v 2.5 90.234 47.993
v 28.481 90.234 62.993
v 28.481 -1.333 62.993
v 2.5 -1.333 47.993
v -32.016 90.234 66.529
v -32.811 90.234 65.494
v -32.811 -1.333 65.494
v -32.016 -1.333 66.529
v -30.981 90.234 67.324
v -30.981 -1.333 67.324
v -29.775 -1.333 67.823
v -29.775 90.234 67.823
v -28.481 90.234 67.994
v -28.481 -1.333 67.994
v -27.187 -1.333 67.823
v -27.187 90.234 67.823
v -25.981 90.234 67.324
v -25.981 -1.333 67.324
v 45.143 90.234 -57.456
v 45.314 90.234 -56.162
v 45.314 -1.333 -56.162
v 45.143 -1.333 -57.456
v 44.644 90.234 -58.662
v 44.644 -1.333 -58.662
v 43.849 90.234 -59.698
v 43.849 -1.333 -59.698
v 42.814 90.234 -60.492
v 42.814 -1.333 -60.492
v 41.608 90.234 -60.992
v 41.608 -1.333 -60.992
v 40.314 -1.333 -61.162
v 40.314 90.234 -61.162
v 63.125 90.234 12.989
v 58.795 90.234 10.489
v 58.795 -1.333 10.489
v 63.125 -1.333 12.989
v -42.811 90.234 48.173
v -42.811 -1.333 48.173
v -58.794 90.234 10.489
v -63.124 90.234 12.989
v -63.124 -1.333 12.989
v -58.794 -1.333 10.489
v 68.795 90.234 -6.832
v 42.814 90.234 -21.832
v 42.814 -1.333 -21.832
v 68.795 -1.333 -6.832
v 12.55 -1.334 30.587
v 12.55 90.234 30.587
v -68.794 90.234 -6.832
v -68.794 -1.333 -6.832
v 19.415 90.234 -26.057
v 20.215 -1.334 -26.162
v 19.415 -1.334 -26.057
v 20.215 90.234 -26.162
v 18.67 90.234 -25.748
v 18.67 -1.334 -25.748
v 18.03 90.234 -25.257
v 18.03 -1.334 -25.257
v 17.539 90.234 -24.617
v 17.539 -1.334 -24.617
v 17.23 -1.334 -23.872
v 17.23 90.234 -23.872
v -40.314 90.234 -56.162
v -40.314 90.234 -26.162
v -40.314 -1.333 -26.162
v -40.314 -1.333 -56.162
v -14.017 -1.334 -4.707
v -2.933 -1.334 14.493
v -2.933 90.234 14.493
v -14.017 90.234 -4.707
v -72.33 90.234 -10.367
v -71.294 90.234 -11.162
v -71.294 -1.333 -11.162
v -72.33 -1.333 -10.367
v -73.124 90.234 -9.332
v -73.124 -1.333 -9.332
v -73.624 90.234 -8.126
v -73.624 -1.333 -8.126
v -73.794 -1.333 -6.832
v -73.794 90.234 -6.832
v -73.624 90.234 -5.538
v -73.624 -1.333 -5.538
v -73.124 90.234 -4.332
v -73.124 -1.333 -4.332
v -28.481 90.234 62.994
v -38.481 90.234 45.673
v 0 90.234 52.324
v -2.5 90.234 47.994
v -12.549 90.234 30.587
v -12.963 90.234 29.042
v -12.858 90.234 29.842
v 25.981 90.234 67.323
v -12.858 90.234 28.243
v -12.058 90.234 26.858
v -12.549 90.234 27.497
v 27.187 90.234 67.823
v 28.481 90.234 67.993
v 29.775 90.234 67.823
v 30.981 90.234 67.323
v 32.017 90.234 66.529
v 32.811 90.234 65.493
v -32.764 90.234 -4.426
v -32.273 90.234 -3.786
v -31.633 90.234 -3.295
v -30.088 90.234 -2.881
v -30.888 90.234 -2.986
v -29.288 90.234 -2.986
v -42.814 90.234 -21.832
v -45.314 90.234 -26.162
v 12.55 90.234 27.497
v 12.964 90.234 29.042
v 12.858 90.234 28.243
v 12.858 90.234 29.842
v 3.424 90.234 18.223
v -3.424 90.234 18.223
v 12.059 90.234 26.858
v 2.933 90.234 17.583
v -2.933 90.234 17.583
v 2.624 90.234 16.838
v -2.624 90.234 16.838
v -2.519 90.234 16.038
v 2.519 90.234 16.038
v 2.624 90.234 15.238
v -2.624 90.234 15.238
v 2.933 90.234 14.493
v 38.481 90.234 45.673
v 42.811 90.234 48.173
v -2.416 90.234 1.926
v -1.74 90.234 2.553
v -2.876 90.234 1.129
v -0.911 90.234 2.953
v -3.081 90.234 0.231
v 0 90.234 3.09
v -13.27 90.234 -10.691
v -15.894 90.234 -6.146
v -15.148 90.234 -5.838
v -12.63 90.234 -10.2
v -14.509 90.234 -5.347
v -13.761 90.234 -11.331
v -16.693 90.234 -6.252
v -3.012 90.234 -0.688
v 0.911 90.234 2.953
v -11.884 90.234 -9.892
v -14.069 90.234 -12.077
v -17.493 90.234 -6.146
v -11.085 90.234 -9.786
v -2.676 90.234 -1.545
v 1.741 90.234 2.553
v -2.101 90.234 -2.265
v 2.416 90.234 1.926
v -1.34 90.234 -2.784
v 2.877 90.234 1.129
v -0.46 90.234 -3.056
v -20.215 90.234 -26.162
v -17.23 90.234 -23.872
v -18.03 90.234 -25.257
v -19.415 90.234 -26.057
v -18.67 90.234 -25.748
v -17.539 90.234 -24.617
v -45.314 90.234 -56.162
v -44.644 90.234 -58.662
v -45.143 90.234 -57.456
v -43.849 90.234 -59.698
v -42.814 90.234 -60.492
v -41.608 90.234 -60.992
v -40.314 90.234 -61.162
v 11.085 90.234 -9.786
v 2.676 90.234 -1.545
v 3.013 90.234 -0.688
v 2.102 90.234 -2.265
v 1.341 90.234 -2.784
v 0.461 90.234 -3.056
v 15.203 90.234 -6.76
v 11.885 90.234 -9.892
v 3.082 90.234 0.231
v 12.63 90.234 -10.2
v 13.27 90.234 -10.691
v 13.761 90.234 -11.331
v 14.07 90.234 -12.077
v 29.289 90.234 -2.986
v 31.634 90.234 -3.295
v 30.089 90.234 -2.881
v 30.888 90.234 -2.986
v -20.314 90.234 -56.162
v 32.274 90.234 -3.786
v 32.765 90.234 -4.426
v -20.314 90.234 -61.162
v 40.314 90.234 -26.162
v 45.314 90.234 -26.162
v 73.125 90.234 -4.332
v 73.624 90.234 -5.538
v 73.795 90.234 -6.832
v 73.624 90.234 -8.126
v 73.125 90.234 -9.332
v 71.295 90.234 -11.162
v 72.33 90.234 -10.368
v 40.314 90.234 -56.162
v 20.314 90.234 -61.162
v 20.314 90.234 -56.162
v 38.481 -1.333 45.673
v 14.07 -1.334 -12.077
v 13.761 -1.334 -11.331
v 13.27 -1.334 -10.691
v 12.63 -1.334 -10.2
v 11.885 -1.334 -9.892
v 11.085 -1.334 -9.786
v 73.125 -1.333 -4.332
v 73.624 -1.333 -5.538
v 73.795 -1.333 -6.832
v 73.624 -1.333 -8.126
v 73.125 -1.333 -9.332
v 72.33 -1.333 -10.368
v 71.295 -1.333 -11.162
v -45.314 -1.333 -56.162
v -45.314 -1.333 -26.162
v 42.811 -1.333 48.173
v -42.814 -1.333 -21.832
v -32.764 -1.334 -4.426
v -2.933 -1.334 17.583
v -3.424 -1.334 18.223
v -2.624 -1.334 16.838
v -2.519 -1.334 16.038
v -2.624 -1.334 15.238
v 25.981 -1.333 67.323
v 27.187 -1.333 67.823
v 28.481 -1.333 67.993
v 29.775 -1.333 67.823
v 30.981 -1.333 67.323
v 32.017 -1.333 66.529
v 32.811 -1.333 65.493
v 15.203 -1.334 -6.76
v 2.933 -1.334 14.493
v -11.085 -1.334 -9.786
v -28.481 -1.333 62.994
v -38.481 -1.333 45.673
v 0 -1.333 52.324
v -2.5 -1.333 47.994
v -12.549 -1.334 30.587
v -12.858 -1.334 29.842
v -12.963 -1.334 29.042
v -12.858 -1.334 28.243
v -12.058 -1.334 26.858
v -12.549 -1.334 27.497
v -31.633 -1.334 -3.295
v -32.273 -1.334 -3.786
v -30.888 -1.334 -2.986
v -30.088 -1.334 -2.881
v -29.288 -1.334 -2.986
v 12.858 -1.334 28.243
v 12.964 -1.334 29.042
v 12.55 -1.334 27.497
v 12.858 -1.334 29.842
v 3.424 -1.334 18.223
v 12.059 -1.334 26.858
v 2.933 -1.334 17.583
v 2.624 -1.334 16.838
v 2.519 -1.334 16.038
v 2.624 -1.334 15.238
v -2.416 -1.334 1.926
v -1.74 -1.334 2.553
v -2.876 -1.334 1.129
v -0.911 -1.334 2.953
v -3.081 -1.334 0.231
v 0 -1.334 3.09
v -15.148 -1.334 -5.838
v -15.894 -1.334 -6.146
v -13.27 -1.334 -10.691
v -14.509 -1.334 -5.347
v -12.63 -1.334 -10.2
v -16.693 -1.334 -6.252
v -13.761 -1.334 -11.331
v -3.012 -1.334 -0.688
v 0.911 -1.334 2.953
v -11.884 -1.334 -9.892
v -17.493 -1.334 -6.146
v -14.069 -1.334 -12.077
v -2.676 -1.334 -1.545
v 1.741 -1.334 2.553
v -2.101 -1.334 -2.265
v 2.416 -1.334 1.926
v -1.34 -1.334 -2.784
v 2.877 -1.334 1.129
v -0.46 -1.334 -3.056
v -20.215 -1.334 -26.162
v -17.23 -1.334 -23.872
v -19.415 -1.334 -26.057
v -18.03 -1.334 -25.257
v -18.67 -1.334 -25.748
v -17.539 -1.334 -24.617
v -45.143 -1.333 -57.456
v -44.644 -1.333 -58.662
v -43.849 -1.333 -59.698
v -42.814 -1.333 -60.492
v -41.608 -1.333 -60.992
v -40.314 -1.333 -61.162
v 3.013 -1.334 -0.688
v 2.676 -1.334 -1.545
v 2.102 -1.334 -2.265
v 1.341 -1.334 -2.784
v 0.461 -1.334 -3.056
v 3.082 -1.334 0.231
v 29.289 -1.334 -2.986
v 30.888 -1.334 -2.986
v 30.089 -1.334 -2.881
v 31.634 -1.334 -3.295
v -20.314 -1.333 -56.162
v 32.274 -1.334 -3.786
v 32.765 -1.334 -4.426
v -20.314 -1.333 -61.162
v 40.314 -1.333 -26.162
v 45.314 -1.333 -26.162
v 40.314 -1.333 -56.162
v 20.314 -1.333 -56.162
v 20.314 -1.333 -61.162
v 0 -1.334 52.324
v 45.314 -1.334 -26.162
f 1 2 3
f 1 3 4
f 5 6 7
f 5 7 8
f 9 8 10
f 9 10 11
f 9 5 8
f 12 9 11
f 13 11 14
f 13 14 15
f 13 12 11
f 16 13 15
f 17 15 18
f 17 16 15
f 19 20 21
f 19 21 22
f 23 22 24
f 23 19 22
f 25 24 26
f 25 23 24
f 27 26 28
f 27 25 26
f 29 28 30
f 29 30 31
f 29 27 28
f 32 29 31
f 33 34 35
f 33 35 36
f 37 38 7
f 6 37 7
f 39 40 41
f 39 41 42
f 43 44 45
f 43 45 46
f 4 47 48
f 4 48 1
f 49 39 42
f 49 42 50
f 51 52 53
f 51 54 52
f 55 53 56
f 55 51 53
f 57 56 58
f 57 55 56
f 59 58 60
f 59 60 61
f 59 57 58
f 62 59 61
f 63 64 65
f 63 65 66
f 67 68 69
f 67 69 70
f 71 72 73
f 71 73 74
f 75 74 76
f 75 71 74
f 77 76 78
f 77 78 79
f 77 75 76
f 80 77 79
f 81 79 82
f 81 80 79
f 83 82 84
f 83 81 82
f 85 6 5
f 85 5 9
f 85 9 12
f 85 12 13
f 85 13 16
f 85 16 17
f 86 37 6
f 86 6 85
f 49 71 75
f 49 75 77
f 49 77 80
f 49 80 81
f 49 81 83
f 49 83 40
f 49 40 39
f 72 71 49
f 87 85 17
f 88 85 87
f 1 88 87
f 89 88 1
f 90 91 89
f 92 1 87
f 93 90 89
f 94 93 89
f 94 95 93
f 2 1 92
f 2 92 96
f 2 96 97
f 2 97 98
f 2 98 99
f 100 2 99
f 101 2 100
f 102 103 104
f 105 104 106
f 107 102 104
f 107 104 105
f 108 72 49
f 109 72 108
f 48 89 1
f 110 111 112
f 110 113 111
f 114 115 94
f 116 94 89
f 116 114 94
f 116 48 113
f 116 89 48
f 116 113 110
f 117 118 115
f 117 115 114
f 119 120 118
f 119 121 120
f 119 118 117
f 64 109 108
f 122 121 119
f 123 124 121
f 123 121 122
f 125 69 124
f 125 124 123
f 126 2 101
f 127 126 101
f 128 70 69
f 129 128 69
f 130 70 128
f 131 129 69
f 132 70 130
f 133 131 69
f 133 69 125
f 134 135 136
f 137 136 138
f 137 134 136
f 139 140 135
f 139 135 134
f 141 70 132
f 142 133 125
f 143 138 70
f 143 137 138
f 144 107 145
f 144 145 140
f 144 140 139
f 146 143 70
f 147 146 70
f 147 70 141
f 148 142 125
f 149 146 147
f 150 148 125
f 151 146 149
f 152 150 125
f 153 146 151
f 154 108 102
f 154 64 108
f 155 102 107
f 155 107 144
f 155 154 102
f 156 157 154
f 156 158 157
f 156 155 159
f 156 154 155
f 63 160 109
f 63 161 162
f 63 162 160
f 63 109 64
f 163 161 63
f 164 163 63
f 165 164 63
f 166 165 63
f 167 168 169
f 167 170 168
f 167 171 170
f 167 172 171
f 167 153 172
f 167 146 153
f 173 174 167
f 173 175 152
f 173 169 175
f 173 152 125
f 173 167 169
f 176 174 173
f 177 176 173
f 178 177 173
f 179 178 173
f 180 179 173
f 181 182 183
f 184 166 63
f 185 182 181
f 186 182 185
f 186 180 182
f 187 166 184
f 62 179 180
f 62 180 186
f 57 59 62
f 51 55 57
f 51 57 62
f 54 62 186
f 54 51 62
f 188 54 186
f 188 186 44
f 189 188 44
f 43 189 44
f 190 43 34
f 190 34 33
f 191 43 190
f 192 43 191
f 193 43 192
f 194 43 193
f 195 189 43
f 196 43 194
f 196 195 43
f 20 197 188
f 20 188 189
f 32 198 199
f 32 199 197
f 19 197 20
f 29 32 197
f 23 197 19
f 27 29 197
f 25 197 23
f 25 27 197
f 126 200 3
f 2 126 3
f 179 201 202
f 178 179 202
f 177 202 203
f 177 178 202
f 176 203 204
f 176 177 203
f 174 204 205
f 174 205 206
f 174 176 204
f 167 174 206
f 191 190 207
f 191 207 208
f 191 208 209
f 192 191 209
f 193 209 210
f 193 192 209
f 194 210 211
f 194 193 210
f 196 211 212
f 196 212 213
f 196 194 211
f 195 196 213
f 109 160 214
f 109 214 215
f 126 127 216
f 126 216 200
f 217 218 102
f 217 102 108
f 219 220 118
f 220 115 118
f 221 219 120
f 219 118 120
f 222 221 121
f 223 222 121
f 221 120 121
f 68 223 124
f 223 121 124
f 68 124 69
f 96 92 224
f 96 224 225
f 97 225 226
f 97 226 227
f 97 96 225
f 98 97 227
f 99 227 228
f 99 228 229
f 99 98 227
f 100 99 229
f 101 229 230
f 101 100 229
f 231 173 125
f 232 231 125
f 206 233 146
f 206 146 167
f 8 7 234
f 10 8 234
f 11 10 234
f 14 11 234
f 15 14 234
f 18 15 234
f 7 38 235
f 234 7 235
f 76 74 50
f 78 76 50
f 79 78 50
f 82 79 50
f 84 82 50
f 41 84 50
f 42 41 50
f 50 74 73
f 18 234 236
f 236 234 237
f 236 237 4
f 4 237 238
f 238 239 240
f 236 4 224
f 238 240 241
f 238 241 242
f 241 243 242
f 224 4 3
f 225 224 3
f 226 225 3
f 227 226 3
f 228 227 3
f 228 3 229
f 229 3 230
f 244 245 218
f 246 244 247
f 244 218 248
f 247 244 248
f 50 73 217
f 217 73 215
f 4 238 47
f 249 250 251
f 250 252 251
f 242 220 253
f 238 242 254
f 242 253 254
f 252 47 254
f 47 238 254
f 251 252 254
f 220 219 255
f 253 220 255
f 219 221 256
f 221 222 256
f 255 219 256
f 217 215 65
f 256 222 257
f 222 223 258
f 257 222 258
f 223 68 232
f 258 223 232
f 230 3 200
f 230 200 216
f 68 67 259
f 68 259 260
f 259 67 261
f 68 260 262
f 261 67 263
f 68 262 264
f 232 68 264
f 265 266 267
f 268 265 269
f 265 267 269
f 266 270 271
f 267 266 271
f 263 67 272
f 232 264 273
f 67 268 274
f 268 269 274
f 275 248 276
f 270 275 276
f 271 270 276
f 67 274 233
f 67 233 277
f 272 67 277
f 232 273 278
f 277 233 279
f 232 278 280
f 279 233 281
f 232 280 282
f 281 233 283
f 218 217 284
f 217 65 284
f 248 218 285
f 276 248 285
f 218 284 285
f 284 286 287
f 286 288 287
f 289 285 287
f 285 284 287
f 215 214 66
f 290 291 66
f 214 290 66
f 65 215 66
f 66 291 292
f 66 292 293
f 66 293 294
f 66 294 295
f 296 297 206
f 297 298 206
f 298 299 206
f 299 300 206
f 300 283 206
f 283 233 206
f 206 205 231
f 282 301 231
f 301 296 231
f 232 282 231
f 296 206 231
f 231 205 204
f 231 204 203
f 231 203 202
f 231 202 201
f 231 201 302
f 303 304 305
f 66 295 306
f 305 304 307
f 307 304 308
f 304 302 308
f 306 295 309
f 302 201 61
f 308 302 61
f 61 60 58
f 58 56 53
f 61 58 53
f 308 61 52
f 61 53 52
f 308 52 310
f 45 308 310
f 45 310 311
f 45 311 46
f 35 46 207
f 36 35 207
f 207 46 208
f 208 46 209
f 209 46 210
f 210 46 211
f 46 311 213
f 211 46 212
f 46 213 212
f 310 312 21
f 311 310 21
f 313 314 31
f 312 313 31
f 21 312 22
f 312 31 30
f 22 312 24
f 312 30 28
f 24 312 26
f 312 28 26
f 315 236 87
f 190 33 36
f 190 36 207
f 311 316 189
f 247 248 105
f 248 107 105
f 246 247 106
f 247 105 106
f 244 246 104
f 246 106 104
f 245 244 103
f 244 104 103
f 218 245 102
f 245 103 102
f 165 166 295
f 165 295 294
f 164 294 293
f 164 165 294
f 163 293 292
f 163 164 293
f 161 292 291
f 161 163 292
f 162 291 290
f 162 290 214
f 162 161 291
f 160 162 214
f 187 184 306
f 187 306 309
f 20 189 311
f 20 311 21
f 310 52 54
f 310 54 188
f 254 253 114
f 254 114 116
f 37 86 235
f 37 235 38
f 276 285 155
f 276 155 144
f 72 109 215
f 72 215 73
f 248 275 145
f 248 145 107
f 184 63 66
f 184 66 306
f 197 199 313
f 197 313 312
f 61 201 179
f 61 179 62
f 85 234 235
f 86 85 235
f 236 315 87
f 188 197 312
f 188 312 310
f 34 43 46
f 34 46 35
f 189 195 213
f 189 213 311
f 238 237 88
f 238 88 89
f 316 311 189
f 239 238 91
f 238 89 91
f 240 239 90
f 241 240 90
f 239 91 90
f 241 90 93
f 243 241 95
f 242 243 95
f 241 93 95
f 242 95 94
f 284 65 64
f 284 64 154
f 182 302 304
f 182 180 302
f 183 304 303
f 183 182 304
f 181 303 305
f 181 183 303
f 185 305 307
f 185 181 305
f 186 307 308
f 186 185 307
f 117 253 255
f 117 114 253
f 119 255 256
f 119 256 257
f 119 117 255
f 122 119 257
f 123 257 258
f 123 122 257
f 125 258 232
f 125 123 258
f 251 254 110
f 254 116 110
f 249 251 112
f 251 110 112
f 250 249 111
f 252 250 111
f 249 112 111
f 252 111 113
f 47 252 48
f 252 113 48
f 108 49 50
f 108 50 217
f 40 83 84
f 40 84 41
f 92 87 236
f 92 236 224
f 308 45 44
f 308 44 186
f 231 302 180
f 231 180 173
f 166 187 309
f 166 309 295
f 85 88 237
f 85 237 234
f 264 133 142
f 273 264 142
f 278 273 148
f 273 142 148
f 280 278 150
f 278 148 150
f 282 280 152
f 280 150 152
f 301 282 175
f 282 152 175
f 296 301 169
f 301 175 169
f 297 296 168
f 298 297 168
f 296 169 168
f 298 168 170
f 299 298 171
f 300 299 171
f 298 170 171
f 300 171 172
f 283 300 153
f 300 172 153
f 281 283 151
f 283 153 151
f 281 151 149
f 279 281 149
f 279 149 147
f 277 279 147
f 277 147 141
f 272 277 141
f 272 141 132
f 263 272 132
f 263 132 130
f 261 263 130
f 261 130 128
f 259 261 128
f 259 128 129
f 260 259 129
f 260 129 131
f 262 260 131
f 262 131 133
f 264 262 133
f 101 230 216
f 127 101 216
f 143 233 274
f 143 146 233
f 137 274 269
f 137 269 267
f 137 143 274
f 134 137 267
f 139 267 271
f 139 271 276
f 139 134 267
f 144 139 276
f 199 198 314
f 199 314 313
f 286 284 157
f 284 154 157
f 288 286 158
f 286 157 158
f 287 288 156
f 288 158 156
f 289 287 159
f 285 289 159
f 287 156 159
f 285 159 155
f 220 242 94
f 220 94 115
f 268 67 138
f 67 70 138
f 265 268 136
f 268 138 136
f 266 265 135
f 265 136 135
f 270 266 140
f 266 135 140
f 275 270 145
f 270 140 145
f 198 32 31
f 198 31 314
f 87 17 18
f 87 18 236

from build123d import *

# Parameters (mm, degrees)
SALIENTE_EXTRUIR1_DEPTH = 88.9
CROQUIS4_R              = 2.999994
CORTAR_EXTRUIR1_DEPTH   = 112.44204772
REDONDEO6_R             = 3
REDONDEO7_R             = 3
ESCALA2_SCALE           = 1.03
SALIENTE_EXTRUIR2_DEPTH = 91.567


with BuildPart() as part:
    # Croquis1 → Saliente-Extruir1 (new body)
    with BuildSketch(Plane(origin=(0, 0, 0), x_dir=(1, 0, 0), z_dir=(0, 1, 0))):
        Polygon((1.696358741, -16.064461222), (13.335, -27.703102481), (0, -50.8), (-13.335, -27.703102481), (-1.696358741, -16.064461222), (-14.760410887, 6.563140847), (-30.659090512, 2.303102481), (-43.994090512, 25.4), (-17.324090512, 25.4), (-13.064052146, 9.501320374), (13.064052146, 9.501320374), (17.324090512, 25.4), (43.994090512, 25.4), (30.659090512, 2.303102481), (14.760410887, 6.563140847), align=None)
    extrude(amount=SALIENTE_EXTRUIR1_DEPTH)

    # Croquis4 → Cortar-Extruir1 (cut, through all)
    with BuildSketch(Plane(origin=(0, 88.9, 0), x_dir=(1, 0, 0), z_dir=(0, 1, 0))):
        with Locations(Location((0, 0, 0), (0, 0, 270))):
            Circle(CROQUIS4_R)
    extrude(amount=-CORTAR_EXTRUIR1_DEPTH, mode=Mode.SUBTRACT)

    # Redondeo6
    redondeo6_edges = [part.edges().sort_by_distance(p)[0] for p in [
        (-1.696358741, 44.45, 16.064461222),
        (-14.760410887, 44.45, -6.563140847),
        (-13.064052146, 44.45, -9.501320374),
        (13.064052146, 44.45, -9.501320374),
        (1.696358741, 44.45, 16.064461222),
    ]]
    fillet(redondeo6_edges, radius=REDONDEO6_R)

    # Redondeo7
    redondeo7_edges = [part.edges().sort_by_distance(p)[0] for p in [
        (-13.335, 44.45, 27.703102481),
        (-30.659090512, 44.45, -2.303102481),
        (-17.324090512, 44.45, -25.4),
        (17.324090512, 44.45, -25.4),
        (30.659090512, 44.45, -2.303102481),
        (13.335, 44.45, 27.703102481),
    ]]
    fillet(redondeo7_edges, radius=REDONDEO7_R)


with BuildPart() as part_1:
    # Escala2: scaled about (-0.008124988, 44.45, 0.003254237)
    add(part.part.scale(ESCALA2_SCALE).moved(Location((0.00024375, -1.3335, -9.7627e-05))))

    # Croquis17 → Saliente-Extruir2 (add, through all)
    with BuildSketch(Plane(origin=(0, 90.2335, 0), x_dir=(1, 0, 0), z_dir=(0, 1, 0))):
        with BuildLine():
            Line((-45.313669478, 56.162097627), (-45.313669478, 26.162097627))
            Line((-45.313669478, 26.162097627), (-40.313669478, 26.162097627))
            Line((-40.313669478, 26.162097627), (-40.313669478, 56.162097627))
            Line((-40.313669478, 56.162097627), (-20.313669478, 56.162097627))
            Line((-20.313669478, 56.162097627), (-20.313669478, 61.162097627))
            Line((-20.313669478, 61.162097627), (-40.313669478, 61.162097627))
            ThreePointArc((-40.313669478, 61.162097627), (-43.849203384, 59.697631533), (-45.313669478, 56.162097627))
        make_face()
        with BuildLine():
            Line((-42.813529111, 21.831727485), (-45.313669478, 26.162097627))
            Line((-45.313669478, 26.162097627), (-71.294291224, 11.161854504))
            ThreePointArc((-71.294291224, 11.161854504), (-73.623920356, 8.125822711), (-73.124418243, 4.331727485))
            Line((-73.124418243, 4.331727485), (-63.124418243, -12.988780591))
            Line((-63.124418243, -12.988780591), (-58.794291224, -10.488780591))
            Line((-58.794291224, -10.488780591), (-68.794291224, 6.831727485))
            Line((-68.794291224, 6.831727485), (-42.813529111, 21.831727485))
        make_face()
        with BuildLine():
            Line((20.313669478, 56.162097627), (40.313669478, 56.162097627))
            Line((40.313669478, 56.162097627), (40.313669478, 26.162097627))
            Line((40.313669478, 26.162097627), (45.313669478, 26.162097627))
            Line((45.313669478, 26.162097627), (45.313669478, 56.162097627))
            ThreePointArc((45.313669478, 56.162097627), (43.849203384, 59.697631533), (40.313669478, 61.162097627))
            Line((40.313669478, 61.162097627), (20.313669478, 61.162097627))
            Line((20.313669478, 61.162097627), (20.313669478, 56.162097627))
        make_face()
        with BuildLine():
            Line((71.294712326, 11.162097627), (45.313669478, 26.162097627))
            Line((45.313669478, 26.162097627), (42.813950212, 21.831970608))
            Line((42.813950212, 21.831970608), (68.794712326, 6.831970608))
            Line((68.794712326, 6.831970608), (58.794712326, -10.488537468))
            Line((58.794712326, -10.488537468), (63.124839345, -12.988537468))
            Line((63.124839345, -12.988537468), (73.124839345, 4.331970608))
            ThreePointArc((73.124839345, 4.331970608), (73.624341457, 8.126065834), (71.294712326, 11.162097627))
        make_face()
        with BuildLine():
            Line((38.481042848, -45.672845092), (28.481042848, -62.993353167))
            Line((28.481042848, -62.993353167), (2.500280734, -47.993353167))
            Line((2.500280734, -47.993353167), (0.000280734, -52.323480186))
            Line((0.000280734, -52.323480186), (25.981042848, -67.323480186))
            ThreePointArc((25.981042848, -67.323480186), (29.775138073, -67.822982299), (32.811169867, -65.493353167))
            Line((32.811169867, -65.493353167), (42.811169867, -48.172845092))
            Line((42.811169867, -48.172845092), (38.481042848, -45.672845092))
        make_face()
        with BuildLine():
            Line((-25.980621746, -67.323723309), (0.000280734, -52.323480186))
            Line((0.000280734, -52.323480186), (-2.499859633, -47.99359629))
            Line((-2.499859633, -47.99359629), (-28.480621746, -62.99359629))
            Line((-28.480621746, -62.99359629), (-38.480621746, -45.673088215))
            Line((-38.480621746, -45.673088215), (-42.810748765, -48.173088215))
            Line((-42.810748765, -48.173088215), (-32.810748765, -65.49359629))
            ThreePointArc((-32.810748765, -65.49359629), (-29.774716972, -67.823225422), (-25.980621746, -67.323723309))
        make_face()
    extrude(amount=-SALIENTE_EXTRUIR2_DEPTH)


solid = part_1.part
